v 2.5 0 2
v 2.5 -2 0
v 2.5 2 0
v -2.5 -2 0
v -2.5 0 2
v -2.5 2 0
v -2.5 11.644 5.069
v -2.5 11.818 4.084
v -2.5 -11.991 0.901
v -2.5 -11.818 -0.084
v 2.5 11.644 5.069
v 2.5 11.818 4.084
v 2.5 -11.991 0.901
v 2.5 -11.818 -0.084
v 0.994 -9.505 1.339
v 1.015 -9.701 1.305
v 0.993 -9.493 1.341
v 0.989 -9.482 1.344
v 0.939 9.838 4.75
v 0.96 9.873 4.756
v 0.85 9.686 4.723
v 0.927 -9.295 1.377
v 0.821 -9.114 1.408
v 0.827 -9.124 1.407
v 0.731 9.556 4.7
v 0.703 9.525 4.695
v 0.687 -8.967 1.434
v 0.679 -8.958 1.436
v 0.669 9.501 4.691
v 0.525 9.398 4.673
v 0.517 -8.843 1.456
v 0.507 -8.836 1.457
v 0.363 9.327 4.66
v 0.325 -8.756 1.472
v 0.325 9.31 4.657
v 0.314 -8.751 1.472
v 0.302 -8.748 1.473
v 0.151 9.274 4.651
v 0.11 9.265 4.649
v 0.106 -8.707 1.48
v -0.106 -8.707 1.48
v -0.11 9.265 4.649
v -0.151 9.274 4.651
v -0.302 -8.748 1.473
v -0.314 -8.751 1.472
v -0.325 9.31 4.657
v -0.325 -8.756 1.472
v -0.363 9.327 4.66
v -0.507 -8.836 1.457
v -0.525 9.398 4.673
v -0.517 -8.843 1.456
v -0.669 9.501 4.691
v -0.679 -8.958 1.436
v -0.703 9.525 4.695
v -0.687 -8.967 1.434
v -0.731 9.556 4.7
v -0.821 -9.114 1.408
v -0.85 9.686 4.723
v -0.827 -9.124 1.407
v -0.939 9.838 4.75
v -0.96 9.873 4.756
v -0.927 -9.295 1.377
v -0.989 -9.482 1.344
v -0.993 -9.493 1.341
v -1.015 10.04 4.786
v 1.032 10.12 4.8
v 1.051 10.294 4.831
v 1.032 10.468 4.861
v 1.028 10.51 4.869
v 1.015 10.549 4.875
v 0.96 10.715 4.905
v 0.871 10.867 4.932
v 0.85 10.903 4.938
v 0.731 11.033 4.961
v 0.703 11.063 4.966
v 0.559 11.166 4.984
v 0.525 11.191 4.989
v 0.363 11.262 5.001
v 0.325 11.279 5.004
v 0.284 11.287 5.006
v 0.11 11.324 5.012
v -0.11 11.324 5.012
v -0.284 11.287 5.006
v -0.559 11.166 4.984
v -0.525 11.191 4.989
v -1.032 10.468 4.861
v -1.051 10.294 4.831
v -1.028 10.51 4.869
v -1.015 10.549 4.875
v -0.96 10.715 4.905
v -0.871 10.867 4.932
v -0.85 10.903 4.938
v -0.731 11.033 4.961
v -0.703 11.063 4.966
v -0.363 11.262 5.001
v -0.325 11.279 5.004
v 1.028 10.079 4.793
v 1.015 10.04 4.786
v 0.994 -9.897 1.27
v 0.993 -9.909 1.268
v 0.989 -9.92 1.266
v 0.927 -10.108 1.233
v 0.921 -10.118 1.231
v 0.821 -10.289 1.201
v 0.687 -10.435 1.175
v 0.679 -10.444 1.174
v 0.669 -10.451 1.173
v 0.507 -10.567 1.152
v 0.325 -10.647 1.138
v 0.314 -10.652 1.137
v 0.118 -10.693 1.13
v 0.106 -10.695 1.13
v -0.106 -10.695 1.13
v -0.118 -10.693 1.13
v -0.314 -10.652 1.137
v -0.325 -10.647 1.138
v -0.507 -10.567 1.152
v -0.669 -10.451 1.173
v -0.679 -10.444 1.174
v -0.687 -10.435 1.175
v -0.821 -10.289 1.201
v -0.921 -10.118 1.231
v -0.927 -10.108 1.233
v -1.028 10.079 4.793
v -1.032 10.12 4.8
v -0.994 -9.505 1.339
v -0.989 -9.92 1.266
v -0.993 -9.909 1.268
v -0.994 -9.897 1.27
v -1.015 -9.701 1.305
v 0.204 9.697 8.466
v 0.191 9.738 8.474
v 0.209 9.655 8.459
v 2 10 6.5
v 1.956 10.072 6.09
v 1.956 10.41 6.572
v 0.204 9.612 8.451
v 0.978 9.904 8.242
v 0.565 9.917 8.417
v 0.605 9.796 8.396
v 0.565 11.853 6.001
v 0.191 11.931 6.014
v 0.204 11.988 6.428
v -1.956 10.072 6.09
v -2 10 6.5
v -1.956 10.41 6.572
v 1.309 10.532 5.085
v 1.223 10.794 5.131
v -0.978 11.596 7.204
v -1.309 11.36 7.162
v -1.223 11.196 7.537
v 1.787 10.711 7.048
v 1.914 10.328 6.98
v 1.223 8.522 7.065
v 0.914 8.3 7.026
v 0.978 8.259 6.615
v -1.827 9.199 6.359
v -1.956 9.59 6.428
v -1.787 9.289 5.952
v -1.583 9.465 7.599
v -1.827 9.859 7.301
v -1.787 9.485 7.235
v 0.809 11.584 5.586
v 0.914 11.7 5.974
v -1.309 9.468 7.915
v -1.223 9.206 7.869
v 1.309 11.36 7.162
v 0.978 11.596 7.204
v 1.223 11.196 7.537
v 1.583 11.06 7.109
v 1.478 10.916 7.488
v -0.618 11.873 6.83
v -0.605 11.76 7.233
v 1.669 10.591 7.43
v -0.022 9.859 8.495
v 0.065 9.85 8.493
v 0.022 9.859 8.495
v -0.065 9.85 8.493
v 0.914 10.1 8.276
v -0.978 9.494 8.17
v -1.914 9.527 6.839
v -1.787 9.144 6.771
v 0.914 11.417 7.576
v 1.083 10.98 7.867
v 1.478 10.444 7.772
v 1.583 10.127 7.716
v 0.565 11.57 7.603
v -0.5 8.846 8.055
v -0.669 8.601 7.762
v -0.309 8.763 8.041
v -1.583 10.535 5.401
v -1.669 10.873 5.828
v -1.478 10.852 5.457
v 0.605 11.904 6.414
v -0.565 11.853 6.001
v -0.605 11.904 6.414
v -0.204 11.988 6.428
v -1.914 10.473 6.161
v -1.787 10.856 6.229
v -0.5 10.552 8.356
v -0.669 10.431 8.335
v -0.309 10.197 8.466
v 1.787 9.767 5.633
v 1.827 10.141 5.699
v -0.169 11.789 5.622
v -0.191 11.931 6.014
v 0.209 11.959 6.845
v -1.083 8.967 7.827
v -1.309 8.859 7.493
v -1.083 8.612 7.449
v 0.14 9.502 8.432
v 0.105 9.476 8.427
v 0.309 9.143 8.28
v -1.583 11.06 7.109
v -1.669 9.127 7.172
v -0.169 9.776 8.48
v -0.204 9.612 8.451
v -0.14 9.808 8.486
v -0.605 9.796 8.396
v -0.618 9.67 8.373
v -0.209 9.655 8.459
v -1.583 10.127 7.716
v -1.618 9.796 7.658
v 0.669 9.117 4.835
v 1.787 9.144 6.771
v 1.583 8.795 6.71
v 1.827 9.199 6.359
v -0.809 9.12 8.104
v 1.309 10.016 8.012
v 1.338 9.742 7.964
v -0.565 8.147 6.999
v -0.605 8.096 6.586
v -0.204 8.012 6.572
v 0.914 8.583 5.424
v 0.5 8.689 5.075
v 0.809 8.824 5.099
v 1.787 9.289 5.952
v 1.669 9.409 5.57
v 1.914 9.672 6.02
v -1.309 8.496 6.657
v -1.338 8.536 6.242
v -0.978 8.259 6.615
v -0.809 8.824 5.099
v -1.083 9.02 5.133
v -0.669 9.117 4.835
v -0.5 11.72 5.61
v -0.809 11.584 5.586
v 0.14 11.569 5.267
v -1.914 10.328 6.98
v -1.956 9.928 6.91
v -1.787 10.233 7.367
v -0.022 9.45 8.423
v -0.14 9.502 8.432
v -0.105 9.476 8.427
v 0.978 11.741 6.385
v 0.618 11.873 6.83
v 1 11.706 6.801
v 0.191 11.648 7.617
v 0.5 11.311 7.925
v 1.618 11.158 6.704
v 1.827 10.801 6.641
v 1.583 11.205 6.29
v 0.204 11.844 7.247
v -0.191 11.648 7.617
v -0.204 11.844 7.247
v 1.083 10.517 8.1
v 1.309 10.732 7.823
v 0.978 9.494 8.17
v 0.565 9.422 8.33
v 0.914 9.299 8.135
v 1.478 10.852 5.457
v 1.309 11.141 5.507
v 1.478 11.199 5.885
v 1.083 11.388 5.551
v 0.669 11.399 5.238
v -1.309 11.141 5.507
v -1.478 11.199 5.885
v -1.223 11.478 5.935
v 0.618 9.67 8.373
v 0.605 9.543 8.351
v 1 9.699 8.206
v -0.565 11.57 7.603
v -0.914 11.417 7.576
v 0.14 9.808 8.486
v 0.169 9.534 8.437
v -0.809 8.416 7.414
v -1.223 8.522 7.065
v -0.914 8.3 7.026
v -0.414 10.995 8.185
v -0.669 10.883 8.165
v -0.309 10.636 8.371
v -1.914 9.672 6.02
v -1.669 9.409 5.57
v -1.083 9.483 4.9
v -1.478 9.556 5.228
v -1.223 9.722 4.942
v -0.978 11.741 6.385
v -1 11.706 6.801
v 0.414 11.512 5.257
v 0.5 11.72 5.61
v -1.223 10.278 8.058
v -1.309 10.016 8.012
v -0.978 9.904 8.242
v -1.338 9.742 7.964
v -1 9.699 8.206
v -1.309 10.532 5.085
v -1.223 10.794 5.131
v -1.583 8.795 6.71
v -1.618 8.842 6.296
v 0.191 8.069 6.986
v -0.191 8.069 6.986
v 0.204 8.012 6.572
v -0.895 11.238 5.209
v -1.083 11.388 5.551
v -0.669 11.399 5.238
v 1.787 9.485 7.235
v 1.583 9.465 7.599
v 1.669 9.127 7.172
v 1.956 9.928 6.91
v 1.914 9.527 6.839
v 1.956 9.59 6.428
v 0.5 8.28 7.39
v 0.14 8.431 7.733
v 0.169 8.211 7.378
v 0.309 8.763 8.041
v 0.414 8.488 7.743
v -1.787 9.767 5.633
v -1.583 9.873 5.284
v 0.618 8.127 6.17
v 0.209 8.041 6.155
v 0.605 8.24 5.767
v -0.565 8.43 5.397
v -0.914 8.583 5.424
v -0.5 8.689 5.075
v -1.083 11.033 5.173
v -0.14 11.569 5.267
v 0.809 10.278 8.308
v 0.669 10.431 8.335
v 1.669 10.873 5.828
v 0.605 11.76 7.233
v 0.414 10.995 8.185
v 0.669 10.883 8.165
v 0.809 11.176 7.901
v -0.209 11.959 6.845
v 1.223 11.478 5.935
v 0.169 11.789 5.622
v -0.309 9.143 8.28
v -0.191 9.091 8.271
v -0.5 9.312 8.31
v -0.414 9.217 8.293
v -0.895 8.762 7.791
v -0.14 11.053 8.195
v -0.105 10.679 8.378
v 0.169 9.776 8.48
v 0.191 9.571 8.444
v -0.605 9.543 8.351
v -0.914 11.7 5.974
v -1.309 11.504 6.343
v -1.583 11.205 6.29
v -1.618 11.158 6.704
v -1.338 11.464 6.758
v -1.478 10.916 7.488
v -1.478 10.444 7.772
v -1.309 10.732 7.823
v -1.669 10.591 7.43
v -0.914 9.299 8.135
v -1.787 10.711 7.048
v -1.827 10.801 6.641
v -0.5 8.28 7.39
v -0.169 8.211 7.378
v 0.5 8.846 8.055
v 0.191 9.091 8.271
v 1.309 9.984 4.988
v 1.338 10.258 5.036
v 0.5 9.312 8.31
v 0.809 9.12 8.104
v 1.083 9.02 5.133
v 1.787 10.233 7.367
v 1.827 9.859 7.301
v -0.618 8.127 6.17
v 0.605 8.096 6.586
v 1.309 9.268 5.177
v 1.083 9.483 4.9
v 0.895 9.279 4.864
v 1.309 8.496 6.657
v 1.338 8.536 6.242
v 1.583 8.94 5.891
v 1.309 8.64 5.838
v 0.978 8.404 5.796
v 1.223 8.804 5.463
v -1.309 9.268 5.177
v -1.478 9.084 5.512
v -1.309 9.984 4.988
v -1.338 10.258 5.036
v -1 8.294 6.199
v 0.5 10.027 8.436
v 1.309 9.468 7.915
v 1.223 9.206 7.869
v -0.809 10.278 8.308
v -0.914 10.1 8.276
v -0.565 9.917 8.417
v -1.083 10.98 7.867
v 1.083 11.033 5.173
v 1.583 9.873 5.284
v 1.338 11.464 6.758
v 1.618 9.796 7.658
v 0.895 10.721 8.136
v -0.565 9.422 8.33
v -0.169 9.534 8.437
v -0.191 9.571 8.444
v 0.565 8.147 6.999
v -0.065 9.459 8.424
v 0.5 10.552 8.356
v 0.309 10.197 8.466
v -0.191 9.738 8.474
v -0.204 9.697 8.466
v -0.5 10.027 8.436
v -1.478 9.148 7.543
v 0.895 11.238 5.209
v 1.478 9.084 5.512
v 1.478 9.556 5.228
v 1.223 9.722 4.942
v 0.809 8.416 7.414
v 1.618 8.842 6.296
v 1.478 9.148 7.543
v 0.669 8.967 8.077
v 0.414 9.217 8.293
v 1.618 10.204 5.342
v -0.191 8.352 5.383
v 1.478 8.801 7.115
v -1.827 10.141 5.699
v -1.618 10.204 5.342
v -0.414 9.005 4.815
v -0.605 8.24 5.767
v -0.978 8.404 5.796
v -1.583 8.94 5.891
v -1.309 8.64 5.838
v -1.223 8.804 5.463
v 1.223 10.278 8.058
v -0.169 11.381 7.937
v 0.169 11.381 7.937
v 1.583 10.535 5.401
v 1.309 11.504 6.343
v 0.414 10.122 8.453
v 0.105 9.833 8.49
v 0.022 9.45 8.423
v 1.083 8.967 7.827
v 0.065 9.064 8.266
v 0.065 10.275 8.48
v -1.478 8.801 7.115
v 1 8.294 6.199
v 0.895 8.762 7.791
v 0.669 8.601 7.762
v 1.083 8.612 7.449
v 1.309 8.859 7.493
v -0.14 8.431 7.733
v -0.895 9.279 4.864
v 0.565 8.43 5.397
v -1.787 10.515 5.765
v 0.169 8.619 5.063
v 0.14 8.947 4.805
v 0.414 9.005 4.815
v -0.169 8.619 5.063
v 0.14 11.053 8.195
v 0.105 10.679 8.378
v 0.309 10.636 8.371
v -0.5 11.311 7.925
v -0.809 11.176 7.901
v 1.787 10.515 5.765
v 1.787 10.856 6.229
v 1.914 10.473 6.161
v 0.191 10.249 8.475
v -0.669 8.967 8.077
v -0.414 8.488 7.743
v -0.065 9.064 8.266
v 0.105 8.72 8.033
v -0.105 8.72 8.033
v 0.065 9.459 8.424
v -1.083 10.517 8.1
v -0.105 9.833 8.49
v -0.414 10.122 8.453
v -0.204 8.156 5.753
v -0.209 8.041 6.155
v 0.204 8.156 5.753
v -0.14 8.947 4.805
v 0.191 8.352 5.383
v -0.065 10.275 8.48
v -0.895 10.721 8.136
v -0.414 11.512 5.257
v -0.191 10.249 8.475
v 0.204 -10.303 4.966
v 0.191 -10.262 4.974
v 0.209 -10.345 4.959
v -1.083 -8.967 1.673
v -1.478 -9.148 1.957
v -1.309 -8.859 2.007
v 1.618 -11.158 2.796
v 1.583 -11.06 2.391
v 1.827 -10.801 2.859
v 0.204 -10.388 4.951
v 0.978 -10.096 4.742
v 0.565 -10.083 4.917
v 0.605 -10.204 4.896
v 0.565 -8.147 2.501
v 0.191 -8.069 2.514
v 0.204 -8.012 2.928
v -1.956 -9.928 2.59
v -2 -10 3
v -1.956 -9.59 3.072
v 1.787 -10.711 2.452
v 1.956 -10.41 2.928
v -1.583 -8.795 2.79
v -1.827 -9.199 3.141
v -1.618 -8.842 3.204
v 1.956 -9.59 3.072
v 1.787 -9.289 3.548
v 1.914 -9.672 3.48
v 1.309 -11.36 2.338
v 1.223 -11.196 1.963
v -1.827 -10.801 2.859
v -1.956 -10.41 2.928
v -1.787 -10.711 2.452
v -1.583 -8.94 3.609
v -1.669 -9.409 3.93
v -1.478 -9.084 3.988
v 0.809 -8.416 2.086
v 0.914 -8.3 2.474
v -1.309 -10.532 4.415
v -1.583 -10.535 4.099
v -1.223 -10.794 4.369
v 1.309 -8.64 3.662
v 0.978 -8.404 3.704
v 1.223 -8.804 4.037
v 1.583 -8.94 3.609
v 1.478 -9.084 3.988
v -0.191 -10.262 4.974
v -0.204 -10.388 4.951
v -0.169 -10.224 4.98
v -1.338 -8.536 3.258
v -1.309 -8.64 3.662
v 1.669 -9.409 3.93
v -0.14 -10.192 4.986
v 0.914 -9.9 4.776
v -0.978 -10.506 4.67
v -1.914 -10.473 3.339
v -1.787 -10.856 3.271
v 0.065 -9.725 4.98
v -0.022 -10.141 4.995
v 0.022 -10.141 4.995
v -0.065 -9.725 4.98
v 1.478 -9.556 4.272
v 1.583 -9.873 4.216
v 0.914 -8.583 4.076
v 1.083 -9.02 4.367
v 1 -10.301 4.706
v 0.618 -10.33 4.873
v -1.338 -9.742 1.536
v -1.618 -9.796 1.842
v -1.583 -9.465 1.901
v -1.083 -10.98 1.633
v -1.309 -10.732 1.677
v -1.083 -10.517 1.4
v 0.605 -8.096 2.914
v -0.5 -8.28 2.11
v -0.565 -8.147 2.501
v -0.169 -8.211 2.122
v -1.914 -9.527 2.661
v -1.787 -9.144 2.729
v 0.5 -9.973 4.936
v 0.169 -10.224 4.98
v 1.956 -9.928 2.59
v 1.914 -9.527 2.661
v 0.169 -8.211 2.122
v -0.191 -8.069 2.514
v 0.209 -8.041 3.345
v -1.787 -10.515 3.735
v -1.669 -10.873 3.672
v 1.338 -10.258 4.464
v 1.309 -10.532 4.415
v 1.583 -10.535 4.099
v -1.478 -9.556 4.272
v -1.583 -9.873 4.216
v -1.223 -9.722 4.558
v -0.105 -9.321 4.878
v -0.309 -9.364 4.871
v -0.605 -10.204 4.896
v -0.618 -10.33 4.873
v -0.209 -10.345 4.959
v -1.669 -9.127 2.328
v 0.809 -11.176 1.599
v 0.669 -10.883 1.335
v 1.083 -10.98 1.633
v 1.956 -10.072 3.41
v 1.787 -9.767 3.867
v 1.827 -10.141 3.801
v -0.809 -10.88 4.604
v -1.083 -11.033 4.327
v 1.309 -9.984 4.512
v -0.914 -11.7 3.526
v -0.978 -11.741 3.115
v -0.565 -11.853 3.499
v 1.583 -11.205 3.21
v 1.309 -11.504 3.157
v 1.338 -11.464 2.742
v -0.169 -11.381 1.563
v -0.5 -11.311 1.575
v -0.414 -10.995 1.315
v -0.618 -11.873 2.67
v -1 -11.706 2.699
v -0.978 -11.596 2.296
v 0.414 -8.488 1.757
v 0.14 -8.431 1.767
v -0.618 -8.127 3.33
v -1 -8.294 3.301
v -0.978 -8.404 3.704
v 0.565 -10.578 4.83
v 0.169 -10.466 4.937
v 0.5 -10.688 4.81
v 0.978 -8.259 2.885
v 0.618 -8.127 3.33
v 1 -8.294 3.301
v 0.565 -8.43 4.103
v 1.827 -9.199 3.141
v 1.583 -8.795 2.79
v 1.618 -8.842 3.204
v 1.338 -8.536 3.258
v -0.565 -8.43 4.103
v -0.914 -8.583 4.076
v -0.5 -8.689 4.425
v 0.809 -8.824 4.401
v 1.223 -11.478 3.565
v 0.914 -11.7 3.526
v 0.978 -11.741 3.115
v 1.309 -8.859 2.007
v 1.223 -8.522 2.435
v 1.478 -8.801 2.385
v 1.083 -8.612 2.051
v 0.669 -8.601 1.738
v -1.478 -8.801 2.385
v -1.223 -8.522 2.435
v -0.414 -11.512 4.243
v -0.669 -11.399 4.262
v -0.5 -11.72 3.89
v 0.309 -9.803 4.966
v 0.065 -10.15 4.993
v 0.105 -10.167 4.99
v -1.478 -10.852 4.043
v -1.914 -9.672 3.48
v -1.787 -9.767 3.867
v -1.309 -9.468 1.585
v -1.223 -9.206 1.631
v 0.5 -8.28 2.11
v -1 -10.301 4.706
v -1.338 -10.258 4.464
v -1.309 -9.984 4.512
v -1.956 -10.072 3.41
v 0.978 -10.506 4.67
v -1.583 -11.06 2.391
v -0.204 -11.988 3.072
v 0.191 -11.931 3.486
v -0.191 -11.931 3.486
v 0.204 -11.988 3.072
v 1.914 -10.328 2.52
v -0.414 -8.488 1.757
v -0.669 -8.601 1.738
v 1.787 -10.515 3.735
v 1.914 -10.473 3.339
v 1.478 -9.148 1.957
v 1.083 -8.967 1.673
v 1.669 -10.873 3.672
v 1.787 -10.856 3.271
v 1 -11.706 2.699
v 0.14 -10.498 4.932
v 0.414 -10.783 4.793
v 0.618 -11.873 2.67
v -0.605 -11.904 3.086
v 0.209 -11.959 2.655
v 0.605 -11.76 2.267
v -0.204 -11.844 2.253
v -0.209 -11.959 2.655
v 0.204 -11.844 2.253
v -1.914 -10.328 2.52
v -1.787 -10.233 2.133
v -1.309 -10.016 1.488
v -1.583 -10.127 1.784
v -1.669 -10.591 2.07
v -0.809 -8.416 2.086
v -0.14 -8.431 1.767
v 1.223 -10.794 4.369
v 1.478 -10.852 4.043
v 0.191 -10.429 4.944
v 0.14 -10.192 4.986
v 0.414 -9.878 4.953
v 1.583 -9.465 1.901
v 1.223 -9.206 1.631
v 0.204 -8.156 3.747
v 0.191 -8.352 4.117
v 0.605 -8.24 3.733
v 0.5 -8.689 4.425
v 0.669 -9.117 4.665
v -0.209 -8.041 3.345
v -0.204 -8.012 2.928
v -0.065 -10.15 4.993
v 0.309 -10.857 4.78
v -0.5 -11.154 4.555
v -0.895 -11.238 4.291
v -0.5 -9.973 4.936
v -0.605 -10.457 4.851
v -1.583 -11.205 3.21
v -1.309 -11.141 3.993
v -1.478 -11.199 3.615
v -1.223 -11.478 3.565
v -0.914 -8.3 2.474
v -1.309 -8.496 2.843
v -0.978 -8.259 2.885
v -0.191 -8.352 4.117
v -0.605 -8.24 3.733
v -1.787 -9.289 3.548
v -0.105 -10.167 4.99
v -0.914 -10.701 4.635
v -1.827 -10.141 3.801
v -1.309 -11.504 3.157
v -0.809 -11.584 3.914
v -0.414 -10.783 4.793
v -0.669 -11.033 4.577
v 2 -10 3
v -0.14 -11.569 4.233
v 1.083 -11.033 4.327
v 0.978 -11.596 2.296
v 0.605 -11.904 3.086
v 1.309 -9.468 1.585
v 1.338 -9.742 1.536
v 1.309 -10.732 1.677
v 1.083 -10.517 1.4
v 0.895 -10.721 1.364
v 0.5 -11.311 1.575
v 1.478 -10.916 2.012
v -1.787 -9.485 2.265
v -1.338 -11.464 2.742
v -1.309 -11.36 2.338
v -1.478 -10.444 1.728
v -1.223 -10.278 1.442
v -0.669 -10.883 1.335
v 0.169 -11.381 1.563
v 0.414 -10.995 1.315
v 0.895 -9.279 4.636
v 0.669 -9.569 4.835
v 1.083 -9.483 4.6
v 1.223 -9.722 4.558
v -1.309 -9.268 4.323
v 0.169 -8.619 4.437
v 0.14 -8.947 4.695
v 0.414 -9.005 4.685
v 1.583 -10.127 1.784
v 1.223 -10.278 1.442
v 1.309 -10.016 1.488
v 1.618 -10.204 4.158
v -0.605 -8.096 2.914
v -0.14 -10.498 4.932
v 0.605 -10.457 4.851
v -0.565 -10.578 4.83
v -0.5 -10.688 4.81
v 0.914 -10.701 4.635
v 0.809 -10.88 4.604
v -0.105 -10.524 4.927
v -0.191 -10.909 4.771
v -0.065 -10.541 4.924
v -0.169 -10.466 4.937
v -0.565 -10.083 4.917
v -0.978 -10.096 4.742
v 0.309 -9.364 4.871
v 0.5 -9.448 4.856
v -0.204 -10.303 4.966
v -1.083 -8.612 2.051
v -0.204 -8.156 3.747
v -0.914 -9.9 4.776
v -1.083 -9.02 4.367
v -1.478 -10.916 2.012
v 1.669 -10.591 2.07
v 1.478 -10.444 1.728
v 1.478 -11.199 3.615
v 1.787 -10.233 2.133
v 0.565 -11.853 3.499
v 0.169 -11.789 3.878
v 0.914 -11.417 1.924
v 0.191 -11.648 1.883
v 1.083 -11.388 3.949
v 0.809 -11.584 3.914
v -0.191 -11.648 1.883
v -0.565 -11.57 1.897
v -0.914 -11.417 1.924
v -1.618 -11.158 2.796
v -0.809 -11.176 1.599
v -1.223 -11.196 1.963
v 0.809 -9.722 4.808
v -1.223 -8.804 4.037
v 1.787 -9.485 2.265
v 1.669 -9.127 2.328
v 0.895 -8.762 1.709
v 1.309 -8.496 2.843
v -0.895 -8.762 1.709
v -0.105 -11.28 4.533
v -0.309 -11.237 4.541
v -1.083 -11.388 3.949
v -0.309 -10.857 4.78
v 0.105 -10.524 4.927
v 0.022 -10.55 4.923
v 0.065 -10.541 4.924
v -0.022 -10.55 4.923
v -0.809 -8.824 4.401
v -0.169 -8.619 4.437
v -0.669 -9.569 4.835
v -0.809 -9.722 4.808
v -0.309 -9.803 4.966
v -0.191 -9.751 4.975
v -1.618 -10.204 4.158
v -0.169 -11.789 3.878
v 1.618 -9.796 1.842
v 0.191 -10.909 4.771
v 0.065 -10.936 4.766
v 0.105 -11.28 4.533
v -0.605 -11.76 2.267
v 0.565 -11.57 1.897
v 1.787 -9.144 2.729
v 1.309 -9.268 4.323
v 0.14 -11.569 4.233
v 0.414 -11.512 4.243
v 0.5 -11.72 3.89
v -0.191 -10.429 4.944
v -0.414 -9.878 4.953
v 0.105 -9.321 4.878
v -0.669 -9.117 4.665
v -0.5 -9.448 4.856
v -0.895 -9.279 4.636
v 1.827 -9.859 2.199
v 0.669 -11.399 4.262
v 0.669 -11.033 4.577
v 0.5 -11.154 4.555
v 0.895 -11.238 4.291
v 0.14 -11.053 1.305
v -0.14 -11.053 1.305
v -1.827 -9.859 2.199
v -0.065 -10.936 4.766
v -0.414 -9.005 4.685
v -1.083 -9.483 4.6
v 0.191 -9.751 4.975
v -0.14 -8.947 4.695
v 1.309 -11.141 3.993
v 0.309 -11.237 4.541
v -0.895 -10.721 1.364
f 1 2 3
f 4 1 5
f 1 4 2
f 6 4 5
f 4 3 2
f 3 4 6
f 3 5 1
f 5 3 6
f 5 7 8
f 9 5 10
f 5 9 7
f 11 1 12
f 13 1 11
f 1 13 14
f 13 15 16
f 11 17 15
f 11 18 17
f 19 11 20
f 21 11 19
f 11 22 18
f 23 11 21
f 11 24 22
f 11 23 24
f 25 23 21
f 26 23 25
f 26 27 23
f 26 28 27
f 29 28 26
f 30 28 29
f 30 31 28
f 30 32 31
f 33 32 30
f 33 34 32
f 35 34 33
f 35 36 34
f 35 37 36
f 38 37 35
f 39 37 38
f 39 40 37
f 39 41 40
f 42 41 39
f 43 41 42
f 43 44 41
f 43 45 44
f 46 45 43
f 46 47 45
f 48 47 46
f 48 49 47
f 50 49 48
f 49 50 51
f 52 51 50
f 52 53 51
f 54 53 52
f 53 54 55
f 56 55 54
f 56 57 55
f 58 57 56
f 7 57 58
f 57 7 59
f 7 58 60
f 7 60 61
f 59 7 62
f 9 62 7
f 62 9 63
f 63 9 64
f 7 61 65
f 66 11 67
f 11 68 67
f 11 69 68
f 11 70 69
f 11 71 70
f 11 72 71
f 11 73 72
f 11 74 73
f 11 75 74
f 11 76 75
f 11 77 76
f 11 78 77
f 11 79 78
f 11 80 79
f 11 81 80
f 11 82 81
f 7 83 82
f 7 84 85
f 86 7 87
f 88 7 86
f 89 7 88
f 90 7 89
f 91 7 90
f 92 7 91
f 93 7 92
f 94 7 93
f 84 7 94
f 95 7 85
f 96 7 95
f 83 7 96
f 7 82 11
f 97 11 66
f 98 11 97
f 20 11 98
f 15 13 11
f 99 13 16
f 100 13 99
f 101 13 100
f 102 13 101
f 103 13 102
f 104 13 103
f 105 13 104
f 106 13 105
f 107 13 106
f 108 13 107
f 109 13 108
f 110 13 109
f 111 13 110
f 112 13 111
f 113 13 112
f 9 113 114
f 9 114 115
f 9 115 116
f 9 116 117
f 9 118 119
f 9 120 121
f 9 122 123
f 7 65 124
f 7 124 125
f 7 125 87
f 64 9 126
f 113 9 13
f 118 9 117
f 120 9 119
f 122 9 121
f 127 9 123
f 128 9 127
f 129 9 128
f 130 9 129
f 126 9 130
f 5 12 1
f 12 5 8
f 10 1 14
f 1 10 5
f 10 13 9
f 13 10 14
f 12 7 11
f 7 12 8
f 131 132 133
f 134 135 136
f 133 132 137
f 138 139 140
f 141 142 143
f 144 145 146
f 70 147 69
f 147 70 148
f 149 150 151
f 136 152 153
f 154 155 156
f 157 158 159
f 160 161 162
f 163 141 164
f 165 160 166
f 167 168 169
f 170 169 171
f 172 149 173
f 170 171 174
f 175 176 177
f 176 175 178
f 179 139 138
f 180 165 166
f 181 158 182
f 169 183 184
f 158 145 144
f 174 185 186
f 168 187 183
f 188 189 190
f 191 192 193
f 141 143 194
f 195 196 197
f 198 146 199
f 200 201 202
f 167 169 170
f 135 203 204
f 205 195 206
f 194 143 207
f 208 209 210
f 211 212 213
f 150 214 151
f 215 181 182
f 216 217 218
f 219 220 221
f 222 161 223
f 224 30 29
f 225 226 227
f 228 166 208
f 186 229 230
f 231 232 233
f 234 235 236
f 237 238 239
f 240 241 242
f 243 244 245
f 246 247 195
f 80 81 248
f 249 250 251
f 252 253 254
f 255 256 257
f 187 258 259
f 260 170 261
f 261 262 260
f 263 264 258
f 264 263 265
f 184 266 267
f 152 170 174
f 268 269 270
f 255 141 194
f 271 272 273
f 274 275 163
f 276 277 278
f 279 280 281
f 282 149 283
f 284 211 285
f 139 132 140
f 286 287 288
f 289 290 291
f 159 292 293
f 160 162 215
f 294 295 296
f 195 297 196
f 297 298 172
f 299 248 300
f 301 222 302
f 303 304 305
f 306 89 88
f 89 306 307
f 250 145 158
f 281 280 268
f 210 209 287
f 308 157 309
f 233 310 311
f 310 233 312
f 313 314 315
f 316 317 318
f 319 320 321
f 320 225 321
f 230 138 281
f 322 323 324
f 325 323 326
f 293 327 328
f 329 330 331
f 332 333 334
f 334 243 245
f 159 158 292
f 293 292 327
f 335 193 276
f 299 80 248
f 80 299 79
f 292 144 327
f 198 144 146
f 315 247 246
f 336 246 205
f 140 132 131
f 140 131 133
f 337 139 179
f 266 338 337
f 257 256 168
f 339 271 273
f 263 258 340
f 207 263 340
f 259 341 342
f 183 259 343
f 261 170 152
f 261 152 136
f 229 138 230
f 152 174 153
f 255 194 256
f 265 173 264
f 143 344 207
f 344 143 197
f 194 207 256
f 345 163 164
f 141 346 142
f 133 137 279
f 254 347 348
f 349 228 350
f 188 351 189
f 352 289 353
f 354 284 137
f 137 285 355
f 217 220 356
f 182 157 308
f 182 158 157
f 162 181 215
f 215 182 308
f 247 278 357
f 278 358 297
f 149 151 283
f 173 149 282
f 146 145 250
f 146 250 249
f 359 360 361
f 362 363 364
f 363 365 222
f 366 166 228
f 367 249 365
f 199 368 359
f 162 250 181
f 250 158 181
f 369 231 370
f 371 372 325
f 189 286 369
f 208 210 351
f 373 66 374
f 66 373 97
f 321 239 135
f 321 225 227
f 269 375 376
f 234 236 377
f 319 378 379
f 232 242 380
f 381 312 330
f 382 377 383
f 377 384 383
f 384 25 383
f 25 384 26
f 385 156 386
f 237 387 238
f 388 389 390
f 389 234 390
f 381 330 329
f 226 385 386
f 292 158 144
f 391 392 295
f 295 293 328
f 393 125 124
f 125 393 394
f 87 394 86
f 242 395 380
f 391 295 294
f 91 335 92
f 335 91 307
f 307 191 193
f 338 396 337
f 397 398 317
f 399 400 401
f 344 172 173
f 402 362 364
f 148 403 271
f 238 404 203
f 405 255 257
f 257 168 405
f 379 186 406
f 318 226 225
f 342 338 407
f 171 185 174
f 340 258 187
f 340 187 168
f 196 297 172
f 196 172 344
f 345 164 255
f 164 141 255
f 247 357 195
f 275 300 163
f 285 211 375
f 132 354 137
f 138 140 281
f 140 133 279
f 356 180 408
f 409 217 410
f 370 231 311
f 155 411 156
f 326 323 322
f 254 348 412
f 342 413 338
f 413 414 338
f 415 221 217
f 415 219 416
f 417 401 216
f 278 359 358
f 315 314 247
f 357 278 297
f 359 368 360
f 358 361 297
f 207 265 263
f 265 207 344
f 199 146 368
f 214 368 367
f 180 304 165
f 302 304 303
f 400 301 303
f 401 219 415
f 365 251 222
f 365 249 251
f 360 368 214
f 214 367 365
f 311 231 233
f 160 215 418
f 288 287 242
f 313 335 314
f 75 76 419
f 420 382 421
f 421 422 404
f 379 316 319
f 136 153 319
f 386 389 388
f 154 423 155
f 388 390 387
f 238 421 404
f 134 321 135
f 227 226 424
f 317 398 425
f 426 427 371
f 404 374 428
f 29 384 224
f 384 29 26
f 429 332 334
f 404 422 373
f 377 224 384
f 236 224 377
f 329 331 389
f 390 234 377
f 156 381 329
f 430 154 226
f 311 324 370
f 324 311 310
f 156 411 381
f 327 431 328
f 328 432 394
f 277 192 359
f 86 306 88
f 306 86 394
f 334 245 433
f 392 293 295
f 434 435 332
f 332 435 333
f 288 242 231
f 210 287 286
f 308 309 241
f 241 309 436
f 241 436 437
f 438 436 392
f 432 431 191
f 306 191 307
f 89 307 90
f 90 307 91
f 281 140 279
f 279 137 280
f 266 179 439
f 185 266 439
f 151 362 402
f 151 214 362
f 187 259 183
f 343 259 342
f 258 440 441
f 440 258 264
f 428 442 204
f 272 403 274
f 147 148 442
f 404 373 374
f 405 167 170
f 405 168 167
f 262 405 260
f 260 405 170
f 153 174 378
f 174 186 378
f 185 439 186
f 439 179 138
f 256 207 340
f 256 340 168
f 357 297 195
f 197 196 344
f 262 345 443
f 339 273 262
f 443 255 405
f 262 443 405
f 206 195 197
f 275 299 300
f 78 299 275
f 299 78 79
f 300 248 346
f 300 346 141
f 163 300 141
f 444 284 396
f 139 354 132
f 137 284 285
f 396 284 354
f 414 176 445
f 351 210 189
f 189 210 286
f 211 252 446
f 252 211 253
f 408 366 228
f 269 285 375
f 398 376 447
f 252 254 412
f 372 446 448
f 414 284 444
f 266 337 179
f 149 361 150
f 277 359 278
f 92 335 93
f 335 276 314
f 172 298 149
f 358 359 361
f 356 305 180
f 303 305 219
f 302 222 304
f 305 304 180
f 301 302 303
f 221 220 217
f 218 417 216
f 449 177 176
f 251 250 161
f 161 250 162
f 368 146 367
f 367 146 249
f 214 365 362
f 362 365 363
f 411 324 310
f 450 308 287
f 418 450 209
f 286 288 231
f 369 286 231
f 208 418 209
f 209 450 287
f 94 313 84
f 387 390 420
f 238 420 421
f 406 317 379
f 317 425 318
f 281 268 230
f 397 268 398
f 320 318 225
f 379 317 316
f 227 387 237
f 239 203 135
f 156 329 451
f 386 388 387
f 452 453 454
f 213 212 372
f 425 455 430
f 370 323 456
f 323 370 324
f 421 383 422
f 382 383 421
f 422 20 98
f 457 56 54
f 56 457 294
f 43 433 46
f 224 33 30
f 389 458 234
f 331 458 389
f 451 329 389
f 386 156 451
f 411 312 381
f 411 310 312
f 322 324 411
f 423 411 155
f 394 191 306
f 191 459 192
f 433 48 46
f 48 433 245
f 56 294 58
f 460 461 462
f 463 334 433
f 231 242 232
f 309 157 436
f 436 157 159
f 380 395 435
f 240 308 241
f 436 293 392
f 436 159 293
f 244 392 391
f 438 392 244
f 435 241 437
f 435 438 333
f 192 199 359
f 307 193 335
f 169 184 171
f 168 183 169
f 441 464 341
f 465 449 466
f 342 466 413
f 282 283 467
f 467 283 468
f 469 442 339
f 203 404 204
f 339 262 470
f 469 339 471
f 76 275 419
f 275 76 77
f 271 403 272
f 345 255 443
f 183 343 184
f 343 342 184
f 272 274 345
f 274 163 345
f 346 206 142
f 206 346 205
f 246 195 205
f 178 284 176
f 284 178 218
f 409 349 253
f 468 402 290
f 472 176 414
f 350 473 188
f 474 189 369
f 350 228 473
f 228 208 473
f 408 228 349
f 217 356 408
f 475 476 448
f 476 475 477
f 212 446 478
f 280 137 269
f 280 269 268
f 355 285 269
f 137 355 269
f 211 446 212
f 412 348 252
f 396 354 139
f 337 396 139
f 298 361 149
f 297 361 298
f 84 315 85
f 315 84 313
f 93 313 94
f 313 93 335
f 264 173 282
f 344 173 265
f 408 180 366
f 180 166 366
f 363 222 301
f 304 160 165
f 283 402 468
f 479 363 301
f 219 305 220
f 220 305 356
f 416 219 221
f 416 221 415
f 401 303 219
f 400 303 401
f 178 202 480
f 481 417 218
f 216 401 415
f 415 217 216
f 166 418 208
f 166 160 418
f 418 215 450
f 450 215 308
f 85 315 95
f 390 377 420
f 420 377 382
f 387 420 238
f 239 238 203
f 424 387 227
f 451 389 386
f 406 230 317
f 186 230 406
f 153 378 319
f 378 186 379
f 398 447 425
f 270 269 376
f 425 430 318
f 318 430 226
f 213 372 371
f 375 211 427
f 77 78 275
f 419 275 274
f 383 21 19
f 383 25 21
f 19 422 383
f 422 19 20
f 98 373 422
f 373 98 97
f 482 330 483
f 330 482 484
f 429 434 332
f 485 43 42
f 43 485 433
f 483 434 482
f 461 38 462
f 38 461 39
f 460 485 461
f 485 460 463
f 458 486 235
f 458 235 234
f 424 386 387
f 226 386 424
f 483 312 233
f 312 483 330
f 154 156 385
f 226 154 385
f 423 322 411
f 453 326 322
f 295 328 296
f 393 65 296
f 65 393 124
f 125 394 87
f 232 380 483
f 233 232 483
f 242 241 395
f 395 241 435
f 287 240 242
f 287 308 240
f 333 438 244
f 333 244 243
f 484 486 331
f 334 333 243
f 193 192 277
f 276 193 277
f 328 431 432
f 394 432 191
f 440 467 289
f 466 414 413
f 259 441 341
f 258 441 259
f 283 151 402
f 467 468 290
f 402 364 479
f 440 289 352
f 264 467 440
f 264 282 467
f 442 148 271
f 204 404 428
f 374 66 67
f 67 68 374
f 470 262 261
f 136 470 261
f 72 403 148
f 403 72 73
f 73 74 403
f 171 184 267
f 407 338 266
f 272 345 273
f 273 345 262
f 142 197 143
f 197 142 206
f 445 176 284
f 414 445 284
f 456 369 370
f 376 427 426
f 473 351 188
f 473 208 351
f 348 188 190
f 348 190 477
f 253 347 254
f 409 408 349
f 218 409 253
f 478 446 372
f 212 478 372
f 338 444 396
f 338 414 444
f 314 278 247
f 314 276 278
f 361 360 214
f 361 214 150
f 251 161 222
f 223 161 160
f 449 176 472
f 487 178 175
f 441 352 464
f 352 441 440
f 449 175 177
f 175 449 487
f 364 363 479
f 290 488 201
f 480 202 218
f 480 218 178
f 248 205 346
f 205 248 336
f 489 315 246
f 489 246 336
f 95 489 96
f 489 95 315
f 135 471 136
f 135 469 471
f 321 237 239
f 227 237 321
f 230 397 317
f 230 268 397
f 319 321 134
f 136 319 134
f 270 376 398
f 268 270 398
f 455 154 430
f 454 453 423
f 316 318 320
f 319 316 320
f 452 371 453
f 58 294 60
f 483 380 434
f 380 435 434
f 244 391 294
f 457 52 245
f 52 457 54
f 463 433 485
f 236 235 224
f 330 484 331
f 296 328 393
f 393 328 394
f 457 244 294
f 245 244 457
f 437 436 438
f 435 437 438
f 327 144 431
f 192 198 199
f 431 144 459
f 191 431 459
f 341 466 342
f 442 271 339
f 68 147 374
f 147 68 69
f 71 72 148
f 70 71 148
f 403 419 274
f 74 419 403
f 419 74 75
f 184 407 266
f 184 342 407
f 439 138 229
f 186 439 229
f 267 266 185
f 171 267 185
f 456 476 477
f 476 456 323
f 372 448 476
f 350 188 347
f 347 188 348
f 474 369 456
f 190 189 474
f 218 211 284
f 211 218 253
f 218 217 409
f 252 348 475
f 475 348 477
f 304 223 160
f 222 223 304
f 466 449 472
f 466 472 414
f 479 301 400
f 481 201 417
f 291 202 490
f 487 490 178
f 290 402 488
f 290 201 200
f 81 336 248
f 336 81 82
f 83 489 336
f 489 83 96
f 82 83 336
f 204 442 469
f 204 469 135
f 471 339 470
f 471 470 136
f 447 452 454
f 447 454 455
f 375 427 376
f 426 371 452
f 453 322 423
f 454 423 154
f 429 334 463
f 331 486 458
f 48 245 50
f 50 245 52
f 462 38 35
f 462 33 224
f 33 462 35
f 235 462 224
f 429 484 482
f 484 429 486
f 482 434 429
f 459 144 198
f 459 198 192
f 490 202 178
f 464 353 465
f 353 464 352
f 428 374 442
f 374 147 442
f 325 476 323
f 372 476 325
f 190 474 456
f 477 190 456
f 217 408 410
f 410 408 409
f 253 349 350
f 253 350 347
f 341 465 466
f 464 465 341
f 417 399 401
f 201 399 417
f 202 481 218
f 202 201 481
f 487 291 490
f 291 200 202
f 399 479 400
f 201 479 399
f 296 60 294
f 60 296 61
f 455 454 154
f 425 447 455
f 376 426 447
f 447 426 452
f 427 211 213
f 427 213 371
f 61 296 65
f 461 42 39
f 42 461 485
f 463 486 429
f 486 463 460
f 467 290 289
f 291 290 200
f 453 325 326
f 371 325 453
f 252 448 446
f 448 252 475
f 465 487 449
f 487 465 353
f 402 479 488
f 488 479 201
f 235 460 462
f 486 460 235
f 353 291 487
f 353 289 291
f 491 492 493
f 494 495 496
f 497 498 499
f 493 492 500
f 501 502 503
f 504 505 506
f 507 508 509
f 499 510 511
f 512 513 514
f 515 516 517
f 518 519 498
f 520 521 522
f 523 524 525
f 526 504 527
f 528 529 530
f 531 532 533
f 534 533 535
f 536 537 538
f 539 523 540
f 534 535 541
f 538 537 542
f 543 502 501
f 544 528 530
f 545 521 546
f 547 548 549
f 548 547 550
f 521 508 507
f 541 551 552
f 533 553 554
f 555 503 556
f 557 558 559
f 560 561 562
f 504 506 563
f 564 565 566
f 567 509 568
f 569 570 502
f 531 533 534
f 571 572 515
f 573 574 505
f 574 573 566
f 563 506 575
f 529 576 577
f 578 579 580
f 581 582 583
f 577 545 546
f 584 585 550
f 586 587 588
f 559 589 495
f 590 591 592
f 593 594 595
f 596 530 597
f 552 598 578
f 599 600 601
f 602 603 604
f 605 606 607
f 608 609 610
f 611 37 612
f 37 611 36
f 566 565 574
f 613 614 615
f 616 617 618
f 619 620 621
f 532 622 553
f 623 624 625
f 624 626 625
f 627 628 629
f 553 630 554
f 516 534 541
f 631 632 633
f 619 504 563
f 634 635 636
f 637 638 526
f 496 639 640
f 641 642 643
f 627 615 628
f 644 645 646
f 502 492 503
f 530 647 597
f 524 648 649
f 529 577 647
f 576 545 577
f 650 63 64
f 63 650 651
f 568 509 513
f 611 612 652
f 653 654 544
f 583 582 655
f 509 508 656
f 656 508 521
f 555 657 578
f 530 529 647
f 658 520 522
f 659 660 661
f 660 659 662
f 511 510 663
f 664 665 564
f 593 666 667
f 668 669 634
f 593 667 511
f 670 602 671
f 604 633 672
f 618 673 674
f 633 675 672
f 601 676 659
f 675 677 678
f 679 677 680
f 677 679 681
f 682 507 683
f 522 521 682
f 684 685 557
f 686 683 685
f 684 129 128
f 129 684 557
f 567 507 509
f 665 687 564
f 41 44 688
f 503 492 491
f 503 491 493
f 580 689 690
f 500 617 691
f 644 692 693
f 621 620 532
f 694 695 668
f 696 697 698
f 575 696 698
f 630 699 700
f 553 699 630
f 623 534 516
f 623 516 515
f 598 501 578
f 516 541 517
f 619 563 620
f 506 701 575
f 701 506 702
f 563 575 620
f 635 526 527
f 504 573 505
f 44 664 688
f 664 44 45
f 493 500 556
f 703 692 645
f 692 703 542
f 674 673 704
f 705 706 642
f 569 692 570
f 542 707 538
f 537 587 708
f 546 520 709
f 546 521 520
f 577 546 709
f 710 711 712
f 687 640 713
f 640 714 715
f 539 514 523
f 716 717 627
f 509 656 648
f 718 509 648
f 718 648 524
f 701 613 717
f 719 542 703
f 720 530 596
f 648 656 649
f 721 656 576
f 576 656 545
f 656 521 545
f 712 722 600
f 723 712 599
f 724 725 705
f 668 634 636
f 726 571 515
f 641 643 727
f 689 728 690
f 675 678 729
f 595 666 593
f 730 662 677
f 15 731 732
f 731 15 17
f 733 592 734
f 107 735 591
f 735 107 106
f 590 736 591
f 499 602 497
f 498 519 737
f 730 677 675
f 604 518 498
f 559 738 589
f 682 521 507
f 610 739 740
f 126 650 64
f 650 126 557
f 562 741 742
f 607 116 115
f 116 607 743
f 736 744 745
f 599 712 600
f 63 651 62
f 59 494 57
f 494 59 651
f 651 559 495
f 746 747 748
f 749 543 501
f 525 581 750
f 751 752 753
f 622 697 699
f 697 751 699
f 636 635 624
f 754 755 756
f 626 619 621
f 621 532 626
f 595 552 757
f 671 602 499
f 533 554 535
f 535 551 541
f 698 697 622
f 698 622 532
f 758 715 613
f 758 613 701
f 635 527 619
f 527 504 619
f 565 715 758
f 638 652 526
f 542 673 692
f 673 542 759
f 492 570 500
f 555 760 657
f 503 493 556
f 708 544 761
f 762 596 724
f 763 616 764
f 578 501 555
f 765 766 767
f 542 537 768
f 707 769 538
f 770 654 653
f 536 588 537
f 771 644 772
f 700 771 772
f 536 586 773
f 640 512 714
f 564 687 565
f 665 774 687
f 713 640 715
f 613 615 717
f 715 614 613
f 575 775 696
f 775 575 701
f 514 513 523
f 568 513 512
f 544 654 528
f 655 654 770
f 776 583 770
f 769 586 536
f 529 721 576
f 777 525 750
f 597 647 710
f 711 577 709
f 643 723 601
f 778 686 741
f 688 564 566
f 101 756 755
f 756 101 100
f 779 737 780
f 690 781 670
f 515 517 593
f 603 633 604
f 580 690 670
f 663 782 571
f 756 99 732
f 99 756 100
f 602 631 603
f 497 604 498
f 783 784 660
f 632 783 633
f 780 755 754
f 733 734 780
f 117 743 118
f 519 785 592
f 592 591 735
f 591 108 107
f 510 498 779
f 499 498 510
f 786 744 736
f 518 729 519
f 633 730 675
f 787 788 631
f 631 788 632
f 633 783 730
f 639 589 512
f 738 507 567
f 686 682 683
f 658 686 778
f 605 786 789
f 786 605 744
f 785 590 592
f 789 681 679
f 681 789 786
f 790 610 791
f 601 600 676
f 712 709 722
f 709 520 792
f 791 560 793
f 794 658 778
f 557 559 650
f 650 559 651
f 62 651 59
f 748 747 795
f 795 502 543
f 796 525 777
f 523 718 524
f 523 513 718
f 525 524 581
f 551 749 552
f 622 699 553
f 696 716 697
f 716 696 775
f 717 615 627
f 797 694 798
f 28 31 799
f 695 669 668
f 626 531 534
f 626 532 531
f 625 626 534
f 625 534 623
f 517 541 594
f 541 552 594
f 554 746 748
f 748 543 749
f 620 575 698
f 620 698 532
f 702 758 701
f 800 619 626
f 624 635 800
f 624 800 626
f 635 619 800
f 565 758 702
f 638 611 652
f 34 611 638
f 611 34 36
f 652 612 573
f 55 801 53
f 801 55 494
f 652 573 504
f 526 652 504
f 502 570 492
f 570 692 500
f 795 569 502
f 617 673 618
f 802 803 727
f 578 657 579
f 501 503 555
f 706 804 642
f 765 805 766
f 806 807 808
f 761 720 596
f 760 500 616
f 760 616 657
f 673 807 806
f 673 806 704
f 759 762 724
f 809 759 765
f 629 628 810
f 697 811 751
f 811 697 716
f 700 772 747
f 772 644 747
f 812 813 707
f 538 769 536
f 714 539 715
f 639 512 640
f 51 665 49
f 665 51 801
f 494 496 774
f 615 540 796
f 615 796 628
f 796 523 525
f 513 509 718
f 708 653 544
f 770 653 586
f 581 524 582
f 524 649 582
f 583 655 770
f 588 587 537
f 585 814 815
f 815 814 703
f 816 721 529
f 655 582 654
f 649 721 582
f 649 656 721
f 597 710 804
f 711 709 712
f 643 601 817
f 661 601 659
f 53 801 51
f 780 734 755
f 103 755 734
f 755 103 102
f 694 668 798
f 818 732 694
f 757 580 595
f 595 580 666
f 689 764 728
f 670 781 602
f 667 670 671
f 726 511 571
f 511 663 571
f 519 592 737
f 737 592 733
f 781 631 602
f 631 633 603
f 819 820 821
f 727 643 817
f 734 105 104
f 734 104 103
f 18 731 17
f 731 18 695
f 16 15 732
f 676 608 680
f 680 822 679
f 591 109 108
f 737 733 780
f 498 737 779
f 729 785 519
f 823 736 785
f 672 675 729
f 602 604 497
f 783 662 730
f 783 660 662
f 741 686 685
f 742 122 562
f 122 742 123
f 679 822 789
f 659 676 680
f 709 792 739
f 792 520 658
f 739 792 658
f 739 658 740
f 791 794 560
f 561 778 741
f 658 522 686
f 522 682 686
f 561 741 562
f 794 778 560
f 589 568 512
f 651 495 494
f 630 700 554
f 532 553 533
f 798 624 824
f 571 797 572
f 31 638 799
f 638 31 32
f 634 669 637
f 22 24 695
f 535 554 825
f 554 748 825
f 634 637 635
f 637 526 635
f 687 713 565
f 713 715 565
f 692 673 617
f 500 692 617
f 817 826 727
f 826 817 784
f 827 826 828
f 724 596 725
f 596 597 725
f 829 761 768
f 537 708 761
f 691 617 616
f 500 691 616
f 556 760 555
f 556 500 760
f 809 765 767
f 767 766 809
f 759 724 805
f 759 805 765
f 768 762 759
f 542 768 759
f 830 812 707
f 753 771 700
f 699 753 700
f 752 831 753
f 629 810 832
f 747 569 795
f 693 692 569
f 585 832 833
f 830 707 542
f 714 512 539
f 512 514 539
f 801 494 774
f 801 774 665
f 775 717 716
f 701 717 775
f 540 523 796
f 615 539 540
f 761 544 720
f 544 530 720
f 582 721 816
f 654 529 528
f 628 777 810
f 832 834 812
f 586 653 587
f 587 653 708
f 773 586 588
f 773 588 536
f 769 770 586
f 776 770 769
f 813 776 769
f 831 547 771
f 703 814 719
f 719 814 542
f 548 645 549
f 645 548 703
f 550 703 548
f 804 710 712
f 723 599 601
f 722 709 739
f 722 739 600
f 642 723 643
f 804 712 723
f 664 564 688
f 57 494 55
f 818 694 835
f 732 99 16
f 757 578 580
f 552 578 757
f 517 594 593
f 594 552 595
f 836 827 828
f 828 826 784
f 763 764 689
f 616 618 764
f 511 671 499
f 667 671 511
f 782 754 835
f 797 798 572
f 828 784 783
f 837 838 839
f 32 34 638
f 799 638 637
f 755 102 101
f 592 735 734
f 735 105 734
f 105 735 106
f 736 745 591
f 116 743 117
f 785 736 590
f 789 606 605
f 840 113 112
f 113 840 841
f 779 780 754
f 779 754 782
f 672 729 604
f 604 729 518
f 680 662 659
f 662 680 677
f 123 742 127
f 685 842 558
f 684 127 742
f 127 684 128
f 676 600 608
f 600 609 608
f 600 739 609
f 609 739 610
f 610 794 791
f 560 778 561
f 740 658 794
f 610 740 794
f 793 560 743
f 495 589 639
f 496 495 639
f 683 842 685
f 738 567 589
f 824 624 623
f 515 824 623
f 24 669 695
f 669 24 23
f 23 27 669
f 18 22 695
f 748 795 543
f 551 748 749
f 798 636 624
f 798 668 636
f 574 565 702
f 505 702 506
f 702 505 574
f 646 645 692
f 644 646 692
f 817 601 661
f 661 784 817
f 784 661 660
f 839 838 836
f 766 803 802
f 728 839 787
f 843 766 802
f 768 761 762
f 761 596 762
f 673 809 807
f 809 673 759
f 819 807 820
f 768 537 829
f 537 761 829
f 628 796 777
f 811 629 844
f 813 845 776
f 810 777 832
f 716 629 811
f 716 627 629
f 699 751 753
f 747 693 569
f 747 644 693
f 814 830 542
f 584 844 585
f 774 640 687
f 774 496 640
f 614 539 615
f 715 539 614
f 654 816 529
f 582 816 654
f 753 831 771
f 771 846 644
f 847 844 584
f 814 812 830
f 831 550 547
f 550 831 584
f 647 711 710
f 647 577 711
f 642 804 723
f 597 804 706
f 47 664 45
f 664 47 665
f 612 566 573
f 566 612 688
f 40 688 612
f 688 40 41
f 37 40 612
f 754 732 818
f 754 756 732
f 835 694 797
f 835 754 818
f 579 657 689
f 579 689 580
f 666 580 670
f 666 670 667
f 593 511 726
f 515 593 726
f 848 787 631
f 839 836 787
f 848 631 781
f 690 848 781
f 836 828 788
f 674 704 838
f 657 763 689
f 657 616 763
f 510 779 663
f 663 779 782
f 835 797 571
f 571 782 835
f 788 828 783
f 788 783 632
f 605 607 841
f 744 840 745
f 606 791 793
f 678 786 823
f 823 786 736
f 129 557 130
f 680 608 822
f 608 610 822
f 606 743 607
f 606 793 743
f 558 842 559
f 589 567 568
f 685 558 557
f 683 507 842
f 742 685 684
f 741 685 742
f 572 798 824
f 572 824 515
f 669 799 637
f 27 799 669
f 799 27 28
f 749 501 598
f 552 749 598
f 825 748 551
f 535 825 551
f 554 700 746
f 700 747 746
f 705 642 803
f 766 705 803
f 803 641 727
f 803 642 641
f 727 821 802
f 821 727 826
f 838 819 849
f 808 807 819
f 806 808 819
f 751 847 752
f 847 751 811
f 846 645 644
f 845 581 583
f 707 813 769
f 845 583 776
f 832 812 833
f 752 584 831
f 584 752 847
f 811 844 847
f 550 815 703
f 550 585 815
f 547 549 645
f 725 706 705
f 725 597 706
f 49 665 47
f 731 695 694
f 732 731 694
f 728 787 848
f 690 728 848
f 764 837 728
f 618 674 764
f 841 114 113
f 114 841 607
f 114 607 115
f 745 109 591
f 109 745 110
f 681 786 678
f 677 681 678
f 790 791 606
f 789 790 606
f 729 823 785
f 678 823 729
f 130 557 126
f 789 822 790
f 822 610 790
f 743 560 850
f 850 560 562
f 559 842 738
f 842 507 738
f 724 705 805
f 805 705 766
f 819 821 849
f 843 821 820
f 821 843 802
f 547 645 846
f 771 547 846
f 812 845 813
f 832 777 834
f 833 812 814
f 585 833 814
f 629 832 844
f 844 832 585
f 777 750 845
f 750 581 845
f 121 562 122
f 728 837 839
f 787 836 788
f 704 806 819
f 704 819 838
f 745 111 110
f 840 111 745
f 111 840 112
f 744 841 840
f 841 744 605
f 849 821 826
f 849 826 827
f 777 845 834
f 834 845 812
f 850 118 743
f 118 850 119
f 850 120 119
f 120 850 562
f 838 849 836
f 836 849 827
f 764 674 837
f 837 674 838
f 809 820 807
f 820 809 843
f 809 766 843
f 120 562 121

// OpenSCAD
$fn=30;

translate([2.5,0,0])rotate([0,-90,0])linear_extrude(5)polygon([
    [0, 2],
    [0, -2],
    [2, 0]
]);

translate([0,0,2])rotate([10,0,0])translate([-2.5, -12, 0])cube([5, 24, 1]);
translate([0, 10, 6.5])rotate([10,0,0])sphere(2);
translate([0, -10, 3])rotate([10,0,0])sphere(2);
